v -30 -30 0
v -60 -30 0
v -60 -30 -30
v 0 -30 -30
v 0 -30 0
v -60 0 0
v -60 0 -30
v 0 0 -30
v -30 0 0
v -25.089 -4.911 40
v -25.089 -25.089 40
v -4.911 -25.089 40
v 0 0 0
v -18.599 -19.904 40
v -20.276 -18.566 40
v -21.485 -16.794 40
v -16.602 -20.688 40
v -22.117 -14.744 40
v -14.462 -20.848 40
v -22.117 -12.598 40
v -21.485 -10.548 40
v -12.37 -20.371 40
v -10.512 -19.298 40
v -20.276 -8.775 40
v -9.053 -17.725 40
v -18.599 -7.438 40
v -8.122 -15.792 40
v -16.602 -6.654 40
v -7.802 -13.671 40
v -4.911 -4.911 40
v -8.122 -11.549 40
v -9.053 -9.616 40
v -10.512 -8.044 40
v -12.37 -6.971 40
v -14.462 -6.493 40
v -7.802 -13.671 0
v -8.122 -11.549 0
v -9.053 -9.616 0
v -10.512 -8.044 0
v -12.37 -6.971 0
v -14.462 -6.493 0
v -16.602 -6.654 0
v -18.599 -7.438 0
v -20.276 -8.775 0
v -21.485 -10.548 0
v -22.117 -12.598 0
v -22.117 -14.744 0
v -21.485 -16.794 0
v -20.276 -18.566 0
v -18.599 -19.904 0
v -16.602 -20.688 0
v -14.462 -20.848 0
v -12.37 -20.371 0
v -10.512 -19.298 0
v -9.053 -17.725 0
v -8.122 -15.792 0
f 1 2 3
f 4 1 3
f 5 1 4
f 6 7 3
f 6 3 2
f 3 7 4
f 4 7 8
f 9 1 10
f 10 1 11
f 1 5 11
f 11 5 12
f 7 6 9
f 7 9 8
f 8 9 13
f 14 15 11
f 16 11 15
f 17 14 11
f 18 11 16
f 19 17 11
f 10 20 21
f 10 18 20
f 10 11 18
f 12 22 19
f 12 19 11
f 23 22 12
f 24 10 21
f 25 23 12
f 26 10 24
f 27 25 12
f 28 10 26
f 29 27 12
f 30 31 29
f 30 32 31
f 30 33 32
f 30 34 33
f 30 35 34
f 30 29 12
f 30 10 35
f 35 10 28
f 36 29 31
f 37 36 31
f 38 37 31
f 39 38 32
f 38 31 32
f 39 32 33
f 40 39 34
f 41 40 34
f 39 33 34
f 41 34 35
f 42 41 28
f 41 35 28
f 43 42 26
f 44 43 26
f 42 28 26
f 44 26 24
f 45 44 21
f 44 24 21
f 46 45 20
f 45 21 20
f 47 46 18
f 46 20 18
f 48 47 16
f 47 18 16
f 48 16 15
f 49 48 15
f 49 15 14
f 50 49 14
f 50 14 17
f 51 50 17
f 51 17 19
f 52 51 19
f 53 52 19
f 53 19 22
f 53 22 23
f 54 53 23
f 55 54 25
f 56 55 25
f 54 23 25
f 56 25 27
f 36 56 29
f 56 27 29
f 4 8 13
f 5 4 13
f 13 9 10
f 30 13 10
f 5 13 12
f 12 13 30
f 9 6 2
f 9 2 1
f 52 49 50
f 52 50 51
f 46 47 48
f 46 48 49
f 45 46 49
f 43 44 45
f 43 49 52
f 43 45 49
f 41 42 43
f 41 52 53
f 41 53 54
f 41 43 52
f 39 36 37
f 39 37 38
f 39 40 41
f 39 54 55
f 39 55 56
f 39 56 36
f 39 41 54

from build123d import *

# Parameters (mm, degrees)
F0_W     = 60
F0_H     = 30
F1_DEPTH = 30
F2_W     = 30
F2_H     = 30
F3_DEPTH = 40
F3_TAPER = 7
F4_R     = 7.1976041046
F5_DEPTH = 40


with BuildPart() as f1:
    # F0 (on Front) → F1 (new body)
    with BuildSketch(Plane.XZ):
        with Locations((-30, -15)):
            Rectangle(F0_W, F0_H)
    extrude(amount=F1_DEPTH)

    # F2 (on face) → F3 (join)
    with BuildSketch(Plane.XY):
        with Locations((-15, -15)):
            Rectangle(F2_W, F2_H)
    extrude(amount=F3_DEPTH, taper=F3_TAPER)

    # F4 (on face) → F5 (cut)
    with BuildSketch(Plane.XY.offset(40)):
        with Locations((-15, -13.6708561331)):
            Circle(F4_R)
    extrude(amount=-F5_DEPTH, mode=Mode.SUBTRACT)


solid = f1.part
